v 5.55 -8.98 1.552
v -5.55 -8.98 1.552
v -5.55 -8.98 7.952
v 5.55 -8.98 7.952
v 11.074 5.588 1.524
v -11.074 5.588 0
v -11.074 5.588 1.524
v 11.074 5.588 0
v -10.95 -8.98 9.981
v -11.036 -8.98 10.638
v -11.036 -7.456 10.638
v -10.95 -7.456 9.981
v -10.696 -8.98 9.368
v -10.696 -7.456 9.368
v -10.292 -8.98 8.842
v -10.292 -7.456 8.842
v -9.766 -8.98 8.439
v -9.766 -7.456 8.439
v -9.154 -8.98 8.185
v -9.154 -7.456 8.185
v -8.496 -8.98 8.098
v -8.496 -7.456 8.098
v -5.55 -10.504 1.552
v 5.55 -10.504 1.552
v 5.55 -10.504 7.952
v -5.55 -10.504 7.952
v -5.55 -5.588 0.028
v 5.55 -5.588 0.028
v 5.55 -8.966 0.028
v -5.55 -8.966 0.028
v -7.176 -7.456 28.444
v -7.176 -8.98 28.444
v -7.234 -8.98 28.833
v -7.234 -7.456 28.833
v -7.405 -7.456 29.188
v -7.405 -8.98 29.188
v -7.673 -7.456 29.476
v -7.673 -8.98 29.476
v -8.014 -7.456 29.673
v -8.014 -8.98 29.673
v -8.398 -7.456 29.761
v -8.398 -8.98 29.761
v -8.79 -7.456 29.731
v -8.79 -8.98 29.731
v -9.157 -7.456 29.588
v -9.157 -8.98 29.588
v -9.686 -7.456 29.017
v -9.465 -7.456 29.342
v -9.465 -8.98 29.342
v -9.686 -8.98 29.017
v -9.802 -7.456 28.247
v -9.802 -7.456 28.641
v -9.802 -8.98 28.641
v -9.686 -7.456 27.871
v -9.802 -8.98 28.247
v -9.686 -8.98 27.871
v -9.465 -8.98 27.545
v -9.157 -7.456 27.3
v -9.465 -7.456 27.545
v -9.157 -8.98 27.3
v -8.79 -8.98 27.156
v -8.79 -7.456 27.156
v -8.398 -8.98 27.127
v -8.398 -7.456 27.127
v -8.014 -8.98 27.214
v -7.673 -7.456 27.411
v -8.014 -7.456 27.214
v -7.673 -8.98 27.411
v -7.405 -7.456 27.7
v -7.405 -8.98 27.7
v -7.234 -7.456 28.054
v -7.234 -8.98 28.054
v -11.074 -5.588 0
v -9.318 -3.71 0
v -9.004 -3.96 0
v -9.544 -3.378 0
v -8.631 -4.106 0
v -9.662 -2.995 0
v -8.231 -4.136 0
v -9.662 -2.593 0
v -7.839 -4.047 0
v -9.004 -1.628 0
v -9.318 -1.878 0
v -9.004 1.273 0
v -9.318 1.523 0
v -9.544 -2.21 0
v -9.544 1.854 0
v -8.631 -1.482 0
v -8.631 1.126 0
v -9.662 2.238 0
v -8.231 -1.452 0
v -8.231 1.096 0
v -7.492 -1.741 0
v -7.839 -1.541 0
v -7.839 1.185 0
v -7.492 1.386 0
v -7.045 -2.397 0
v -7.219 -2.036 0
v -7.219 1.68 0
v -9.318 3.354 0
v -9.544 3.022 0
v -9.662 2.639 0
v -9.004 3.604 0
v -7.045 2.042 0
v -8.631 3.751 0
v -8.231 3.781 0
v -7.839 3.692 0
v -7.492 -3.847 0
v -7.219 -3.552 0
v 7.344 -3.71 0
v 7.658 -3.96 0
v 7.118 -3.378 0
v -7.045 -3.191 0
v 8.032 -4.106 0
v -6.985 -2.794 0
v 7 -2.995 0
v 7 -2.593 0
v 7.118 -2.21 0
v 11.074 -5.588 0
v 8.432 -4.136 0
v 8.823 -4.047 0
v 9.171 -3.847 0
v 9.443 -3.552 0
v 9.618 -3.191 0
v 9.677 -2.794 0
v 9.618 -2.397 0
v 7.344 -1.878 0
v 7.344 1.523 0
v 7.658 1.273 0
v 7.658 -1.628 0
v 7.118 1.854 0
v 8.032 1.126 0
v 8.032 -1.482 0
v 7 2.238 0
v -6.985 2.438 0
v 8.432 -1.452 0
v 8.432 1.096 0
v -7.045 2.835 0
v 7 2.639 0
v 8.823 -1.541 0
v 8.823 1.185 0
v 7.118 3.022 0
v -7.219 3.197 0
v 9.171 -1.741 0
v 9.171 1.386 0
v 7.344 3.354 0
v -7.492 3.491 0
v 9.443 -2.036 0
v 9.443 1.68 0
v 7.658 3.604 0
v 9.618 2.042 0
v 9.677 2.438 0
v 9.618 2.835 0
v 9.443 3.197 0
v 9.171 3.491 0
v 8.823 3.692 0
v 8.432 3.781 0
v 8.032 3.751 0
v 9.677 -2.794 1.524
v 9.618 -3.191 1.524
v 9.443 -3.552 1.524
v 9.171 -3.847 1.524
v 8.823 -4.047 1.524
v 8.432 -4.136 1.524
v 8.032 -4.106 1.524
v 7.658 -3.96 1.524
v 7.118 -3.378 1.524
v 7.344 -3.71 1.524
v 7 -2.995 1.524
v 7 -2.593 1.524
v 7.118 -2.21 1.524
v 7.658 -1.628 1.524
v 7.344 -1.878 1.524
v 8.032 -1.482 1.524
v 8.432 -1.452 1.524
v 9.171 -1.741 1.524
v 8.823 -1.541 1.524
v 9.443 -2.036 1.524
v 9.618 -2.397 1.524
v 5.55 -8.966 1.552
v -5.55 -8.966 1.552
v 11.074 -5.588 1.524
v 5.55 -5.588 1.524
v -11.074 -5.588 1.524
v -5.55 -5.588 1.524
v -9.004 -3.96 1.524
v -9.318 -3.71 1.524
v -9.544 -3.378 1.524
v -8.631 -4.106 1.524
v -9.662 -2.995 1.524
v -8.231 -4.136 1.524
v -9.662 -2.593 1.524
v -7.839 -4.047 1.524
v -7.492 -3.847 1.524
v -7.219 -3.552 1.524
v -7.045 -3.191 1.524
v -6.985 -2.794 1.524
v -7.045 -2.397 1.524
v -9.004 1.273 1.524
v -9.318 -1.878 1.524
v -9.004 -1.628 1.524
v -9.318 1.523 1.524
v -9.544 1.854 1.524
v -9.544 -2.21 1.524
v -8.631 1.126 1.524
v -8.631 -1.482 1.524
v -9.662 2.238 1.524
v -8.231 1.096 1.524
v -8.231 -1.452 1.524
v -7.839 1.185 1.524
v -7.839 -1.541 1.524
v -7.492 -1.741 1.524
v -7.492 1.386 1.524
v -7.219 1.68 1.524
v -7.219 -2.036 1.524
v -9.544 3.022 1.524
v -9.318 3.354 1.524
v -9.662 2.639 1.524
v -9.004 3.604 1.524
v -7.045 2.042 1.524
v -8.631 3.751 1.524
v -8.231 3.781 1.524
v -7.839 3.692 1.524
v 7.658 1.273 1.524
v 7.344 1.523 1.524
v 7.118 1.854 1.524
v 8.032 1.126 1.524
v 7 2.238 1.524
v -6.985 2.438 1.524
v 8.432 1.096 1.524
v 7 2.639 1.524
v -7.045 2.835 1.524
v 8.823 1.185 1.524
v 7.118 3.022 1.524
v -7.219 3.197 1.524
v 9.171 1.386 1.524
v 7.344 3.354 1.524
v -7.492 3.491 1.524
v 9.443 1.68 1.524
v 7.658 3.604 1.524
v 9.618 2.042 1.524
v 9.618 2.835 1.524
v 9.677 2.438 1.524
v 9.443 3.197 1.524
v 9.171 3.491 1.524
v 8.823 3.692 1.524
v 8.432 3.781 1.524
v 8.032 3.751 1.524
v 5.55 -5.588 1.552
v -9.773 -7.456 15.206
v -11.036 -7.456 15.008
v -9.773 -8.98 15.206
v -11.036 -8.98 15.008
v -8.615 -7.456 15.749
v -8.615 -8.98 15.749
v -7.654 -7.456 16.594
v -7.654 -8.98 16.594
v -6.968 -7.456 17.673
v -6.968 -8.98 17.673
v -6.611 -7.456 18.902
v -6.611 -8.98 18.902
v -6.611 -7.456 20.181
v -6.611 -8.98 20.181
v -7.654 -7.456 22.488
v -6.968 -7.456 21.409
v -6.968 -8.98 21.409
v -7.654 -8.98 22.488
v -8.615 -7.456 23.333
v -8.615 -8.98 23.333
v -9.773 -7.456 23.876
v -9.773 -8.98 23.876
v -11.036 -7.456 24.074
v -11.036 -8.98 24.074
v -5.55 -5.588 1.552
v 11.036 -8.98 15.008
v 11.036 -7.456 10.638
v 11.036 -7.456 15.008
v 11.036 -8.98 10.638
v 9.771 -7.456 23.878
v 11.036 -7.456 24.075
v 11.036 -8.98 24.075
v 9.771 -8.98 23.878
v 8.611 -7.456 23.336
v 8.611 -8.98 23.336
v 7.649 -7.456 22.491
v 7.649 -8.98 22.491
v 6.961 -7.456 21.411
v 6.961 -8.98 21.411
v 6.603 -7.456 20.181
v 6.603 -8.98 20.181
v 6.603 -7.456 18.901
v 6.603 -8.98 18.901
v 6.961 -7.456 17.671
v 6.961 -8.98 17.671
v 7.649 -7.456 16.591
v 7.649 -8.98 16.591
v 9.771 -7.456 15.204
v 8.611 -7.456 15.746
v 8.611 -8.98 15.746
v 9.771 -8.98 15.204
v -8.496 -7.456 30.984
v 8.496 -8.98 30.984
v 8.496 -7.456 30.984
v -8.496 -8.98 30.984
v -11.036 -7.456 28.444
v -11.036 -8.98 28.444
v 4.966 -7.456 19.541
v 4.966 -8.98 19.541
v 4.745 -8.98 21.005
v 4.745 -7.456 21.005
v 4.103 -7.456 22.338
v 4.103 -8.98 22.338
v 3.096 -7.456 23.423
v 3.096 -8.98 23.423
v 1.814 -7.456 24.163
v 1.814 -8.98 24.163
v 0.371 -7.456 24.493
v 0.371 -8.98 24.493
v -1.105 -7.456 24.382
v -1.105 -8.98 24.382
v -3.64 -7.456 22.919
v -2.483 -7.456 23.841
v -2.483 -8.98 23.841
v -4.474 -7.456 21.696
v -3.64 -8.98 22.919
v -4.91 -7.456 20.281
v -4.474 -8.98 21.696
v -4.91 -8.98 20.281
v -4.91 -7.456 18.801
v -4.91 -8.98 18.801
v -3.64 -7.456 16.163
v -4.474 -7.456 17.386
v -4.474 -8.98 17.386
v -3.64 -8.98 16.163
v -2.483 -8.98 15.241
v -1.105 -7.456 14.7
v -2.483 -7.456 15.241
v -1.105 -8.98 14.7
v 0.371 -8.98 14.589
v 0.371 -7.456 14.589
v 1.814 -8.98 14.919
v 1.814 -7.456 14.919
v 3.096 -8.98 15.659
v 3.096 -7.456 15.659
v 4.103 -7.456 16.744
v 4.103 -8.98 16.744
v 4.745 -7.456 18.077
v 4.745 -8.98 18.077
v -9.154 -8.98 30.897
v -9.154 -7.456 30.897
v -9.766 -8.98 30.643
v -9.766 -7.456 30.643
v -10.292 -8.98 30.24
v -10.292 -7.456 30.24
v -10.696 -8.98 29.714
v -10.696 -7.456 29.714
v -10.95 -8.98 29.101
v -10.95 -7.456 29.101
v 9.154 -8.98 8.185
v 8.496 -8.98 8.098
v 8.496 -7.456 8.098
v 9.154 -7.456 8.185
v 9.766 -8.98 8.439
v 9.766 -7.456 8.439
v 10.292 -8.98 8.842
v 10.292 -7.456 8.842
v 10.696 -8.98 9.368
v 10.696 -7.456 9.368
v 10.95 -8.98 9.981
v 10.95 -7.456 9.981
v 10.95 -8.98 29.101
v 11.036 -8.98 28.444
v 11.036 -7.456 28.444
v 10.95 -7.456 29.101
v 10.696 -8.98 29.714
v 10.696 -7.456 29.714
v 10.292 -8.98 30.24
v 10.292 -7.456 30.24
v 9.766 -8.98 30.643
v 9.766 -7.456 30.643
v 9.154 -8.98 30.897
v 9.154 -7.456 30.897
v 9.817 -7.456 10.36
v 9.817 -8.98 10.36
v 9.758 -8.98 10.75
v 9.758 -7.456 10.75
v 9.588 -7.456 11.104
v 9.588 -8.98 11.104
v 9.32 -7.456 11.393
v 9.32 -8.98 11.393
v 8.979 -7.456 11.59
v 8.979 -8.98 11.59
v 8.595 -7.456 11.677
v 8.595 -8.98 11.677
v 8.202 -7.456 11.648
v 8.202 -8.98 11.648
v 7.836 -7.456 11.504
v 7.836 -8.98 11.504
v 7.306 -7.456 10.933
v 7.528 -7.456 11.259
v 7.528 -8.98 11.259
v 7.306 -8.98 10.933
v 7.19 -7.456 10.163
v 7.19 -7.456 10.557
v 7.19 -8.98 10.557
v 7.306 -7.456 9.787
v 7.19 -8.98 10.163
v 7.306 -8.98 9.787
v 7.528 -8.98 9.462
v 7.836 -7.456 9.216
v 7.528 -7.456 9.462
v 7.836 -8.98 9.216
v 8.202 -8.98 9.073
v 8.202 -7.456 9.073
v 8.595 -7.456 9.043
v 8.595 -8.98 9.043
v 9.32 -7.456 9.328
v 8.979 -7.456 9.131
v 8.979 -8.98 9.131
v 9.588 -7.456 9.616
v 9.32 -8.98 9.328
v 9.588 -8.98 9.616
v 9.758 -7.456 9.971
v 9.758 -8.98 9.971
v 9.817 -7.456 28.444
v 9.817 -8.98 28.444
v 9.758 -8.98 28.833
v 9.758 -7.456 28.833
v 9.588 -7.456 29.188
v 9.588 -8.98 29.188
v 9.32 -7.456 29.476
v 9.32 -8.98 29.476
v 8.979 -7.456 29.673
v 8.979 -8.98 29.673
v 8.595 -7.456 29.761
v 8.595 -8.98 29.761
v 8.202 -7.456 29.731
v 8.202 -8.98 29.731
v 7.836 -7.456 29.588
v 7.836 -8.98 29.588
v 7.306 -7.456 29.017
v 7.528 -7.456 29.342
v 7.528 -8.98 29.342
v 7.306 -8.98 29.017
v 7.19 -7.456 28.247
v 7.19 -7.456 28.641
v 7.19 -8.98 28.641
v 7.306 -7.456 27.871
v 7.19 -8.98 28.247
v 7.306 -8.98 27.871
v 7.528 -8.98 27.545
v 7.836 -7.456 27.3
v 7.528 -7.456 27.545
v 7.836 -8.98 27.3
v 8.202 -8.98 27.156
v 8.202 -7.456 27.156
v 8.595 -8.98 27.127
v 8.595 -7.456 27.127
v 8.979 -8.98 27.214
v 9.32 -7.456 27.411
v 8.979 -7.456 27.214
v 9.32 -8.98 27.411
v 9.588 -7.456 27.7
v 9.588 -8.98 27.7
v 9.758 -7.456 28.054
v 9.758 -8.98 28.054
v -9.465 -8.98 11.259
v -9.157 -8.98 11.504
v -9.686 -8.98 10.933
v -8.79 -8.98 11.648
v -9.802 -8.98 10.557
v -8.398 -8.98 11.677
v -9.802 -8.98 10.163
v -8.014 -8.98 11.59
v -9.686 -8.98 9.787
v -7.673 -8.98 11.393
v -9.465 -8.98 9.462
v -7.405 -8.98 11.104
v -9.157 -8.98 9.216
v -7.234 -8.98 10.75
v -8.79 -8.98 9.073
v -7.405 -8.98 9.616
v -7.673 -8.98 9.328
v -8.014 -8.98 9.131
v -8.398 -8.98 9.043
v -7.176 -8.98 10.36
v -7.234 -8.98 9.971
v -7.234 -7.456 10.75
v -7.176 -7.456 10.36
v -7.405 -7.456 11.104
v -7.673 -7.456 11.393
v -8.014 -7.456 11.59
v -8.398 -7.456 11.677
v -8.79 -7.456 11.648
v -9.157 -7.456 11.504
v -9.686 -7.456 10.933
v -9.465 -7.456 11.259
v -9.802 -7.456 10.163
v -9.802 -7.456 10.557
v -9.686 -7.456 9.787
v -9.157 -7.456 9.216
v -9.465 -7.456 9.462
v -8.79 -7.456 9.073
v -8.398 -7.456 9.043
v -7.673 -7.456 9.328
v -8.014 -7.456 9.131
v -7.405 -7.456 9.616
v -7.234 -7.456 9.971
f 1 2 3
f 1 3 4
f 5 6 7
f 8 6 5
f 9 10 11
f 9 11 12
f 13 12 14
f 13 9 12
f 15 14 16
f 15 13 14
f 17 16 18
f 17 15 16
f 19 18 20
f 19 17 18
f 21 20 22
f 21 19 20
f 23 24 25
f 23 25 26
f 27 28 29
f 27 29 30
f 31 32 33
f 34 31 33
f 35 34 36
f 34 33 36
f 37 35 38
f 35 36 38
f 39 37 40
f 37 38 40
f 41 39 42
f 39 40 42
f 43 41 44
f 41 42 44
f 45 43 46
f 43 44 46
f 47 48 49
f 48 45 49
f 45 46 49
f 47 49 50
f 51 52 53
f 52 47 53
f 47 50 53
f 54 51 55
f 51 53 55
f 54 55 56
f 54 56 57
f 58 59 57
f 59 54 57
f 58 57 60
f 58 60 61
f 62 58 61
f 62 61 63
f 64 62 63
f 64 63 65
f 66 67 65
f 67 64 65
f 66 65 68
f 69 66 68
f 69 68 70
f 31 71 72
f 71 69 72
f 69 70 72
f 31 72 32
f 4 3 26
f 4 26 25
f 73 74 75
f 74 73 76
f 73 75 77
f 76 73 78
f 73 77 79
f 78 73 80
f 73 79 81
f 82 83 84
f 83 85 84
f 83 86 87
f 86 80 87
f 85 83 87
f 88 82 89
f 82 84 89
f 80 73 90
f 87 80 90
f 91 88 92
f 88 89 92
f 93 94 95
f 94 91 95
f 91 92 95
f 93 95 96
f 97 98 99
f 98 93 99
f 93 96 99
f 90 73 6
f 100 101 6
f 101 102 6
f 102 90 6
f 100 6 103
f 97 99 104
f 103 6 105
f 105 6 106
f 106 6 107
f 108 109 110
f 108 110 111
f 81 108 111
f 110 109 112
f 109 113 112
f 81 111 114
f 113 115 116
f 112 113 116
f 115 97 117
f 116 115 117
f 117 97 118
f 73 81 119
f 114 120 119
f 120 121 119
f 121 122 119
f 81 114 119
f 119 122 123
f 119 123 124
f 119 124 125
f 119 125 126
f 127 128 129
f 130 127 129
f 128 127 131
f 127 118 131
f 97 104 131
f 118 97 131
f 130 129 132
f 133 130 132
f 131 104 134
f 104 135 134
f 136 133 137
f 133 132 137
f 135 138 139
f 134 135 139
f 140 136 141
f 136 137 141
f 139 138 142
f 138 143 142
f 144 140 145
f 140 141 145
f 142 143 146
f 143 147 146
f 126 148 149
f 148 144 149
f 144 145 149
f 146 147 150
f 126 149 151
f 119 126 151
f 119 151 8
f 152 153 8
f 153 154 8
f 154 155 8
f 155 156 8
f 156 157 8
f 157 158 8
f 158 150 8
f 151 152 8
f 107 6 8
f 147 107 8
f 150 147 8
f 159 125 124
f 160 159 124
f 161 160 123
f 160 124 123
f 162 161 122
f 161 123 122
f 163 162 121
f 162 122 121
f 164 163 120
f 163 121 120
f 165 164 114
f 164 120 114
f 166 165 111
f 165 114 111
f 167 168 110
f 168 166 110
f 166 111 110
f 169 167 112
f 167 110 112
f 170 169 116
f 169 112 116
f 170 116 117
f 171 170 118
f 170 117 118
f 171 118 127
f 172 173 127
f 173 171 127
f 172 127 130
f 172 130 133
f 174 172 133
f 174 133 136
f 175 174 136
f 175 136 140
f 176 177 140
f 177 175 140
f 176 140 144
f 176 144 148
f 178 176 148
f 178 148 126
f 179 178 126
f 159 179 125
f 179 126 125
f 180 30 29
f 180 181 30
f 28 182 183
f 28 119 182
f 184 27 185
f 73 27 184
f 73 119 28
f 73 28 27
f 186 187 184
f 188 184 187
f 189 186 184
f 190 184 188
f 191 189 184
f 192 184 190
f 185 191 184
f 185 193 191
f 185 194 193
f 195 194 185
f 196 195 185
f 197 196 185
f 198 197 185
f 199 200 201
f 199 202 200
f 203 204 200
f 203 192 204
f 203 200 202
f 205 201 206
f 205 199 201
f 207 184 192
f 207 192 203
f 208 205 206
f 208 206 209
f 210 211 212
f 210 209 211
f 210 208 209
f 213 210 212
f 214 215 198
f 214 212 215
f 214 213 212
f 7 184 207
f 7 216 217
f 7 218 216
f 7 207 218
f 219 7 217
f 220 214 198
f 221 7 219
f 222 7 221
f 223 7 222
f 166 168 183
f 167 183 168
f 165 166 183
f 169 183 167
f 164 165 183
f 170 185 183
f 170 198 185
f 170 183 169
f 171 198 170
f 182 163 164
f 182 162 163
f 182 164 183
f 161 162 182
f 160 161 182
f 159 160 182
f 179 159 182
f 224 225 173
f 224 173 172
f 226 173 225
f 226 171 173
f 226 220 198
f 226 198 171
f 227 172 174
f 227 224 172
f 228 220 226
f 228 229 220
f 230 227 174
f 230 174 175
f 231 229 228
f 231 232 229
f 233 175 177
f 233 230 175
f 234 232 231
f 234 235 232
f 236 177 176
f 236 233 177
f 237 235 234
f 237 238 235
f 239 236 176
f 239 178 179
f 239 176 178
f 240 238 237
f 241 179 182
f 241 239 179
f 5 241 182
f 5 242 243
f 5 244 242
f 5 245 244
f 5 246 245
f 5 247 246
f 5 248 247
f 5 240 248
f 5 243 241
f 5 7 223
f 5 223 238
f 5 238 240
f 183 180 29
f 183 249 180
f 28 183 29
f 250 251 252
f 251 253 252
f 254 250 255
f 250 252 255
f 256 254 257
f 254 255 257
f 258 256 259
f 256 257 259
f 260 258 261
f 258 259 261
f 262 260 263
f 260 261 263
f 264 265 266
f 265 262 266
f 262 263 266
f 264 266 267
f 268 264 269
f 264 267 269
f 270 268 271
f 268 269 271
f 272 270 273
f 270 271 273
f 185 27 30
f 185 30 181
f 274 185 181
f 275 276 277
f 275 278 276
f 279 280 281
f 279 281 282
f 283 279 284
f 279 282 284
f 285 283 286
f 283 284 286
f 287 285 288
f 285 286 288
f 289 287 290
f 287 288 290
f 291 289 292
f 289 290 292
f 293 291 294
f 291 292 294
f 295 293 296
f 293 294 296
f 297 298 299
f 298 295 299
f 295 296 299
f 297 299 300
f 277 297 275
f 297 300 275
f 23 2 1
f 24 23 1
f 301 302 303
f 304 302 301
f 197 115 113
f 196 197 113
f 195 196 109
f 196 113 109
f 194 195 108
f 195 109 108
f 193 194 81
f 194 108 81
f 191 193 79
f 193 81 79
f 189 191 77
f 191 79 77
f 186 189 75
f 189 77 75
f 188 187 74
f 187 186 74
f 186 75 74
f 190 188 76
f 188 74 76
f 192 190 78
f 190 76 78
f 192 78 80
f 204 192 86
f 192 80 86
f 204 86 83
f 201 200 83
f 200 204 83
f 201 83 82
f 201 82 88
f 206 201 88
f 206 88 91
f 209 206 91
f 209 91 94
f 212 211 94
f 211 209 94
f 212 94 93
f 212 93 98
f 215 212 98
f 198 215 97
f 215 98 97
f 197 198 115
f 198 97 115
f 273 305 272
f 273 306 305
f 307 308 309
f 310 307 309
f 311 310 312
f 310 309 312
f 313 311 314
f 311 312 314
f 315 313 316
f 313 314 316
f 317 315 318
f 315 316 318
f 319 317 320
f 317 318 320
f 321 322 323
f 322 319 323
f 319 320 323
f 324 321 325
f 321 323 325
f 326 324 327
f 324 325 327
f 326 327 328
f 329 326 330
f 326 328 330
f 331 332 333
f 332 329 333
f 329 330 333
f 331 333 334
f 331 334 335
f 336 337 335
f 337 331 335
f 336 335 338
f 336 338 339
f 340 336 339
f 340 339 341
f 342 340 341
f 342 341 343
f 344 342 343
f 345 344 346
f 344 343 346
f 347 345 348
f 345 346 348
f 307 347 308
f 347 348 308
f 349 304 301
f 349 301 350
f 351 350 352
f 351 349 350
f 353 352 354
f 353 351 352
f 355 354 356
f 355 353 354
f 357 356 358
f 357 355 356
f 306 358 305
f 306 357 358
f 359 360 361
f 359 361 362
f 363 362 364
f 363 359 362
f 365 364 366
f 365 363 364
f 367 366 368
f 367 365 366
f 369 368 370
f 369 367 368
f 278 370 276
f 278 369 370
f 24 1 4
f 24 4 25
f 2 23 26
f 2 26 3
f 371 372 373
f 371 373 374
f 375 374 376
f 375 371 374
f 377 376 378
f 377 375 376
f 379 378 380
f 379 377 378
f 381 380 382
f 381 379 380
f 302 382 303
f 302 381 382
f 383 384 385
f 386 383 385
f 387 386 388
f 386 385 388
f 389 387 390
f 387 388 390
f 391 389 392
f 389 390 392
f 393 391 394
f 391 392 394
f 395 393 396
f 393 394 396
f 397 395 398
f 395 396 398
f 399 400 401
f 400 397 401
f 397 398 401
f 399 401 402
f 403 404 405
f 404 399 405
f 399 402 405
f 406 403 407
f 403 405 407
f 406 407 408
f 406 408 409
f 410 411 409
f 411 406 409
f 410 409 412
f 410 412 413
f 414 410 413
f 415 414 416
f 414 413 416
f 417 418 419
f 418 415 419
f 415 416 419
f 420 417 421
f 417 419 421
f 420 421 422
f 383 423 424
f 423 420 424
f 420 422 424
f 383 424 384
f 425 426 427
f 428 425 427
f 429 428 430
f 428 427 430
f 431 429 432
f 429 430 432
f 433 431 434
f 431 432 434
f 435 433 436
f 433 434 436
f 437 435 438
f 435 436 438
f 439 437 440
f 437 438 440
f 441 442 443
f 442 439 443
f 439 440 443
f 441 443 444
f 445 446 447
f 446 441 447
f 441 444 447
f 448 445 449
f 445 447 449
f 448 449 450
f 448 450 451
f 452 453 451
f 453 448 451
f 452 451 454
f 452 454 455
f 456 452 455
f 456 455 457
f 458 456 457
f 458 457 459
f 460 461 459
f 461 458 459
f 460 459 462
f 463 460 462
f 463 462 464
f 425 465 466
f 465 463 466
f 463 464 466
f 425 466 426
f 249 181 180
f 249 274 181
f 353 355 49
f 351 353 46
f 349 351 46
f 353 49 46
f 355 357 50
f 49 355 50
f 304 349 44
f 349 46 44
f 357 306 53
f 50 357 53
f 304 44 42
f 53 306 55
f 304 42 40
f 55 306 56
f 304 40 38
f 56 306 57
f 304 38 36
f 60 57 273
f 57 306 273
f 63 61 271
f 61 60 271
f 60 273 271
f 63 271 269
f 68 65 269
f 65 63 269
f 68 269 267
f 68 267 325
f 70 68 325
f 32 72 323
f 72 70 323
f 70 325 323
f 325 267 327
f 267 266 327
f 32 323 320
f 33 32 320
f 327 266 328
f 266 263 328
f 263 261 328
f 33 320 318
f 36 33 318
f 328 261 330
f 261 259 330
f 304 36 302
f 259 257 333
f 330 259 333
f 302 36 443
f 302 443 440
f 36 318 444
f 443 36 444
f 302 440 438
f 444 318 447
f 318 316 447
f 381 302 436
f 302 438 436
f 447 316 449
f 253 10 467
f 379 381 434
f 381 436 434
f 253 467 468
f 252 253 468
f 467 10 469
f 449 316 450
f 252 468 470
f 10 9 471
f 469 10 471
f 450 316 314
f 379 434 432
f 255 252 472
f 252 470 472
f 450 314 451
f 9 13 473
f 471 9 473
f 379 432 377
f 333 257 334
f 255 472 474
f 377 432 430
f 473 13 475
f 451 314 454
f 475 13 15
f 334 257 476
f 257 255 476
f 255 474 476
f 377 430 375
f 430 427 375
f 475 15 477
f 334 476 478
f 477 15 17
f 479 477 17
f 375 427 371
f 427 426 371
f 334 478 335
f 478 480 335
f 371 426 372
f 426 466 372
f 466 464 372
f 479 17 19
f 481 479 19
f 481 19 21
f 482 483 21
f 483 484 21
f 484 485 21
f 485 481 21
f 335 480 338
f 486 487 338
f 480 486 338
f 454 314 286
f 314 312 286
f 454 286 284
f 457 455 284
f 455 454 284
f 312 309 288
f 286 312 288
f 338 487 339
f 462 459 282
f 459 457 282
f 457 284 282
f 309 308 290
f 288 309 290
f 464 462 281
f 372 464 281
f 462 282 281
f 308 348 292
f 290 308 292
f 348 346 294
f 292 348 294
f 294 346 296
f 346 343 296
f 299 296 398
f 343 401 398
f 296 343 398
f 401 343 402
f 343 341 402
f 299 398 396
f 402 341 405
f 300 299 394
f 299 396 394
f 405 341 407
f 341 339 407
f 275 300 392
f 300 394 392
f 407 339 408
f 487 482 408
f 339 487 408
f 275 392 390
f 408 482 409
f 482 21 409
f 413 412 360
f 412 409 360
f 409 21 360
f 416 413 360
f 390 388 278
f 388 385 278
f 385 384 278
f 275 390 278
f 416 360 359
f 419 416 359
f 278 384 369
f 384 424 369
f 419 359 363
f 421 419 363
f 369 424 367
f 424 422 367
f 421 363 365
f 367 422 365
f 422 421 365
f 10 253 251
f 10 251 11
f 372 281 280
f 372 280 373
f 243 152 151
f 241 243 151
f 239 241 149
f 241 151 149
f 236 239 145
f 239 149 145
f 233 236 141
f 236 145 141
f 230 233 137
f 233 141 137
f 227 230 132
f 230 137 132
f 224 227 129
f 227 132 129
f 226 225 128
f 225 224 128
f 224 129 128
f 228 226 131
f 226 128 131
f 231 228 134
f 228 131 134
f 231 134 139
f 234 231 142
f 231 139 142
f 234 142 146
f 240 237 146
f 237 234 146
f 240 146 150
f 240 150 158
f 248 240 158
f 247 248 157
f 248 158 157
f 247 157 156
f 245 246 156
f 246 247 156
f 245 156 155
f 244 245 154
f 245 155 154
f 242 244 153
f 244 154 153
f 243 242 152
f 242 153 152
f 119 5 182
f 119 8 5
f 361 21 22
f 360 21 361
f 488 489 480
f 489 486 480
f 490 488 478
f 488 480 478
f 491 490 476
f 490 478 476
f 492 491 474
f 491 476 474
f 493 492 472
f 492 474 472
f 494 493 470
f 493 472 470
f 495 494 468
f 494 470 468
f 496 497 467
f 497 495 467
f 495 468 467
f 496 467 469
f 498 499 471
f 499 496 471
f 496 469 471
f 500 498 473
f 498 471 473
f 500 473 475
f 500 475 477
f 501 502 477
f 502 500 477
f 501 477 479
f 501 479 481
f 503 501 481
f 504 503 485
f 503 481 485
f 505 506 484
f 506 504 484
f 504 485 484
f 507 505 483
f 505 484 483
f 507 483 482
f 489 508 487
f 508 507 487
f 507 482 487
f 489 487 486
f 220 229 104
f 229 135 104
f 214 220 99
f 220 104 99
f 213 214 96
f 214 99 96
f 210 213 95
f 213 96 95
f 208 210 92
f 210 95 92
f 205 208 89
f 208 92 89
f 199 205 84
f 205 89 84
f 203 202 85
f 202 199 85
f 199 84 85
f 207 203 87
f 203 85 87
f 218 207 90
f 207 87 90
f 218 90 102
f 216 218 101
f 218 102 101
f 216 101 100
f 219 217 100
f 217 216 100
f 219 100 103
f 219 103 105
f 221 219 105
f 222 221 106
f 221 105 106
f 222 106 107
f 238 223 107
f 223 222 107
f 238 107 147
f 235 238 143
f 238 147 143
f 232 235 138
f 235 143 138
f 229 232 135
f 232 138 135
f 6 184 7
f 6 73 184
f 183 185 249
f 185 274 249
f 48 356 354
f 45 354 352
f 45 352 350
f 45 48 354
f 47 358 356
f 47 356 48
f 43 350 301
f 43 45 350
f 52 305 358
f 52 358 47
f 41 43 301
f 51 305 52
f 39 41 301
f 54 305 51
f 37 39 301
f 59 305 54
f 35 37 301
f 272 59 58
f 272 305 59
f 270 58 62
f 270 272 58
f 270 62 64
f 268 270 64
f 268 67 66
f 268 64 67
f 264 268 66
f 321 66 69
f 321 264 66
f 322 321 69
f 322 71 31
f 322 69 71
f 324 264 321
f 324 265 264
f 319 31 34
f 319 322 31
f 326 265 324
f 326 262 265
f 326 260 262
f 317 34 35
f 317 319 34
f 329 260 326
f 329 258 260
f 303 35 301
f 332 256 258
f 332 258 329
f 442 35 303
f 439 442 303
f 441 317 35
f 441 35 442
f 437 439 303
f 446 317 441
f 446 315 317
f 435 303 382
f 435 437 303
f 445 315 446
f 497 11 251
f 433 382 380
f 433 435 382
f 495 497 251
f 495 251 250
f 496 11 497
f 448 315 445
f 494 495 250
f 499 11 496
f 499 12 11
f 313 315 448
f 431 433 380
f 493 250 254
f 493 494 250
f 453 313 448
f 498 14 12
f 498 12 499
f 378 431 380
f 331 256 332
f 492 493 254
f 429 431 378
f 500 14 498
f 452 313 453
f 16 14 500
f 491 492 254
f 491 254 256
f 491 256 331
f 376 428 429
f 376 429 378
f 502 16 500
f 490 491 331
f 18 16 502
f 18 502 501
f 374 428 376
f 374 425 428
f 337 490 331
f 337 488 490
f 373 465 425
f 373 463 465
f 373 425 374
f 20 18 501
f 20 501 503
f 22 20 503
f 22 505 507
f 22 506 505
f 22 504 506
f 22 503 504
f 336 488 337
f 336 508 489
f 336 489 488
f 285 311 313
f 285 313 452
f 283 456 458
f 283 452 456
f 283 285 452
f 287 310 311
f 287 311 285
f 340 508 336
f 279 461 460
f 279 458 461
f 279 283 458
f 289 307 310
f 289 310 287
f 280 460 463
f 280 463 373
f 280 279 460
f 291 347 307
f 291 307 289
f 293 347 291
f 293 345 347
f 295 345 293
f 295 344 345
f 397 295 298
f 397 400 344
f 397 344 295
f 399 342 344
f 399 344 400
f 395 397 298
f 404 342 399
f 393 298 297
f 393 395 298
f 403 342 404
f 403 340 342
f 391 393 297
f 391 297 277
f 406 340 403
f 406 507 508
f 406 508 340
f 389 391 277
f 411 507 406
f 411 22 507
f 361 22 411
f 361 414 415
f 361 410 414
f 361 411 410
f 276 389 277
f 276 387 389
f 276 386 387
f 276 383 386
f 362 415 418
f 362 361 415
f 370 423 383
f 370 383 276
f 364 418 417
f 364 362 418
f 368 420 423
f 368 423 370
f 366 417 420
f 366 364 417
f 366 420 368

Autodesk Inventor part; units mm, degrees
ref_plane "YZ Plane" through (0, 0, 0) normal (1, 0, 0) x (0, 1, 0)
ref_plane "XZ Plane" through (0, 0, 0) normal (0, 1, 0) x (-1, 0, 0)
ref_plane "XY Plane" through (0, 0, 0) normal (0, 0, 1) x (1, 0, 0)
sketch "Sketch1" plane through (0, 0, 0) normal (0, 0, 1) x (1, 0, 0)
  line L0 (-11.0744, 5.588) -> (11.0744, 5.588)
  line L1 (11.0744, 5.588) -> (11.0744, -5.588)
  line L2 (11.0744, -5.588) -> (-11.0744, -5.588)
  line L3 (-11.0744, -5.588) -> (-11.0744, 5.588)
  circle A0 centre (-8.3312, 2.4384) radius 1.3462
  circle A1 centre (8.3312, 2.4384) radius 1.3462
  circle A2 centre (8.3312, -2.794) radius 1.3462
  circle A3 centre (-8.3312, -2.794) radius 1.3462
  point P0 (0, 0)
  dimension "d0" = 22.1488
  dimension "d1" = 11.176
  dimension "d2" = 2.6924
  dimension "d3" = 2.6924
  dimension "d4" = 2.6924
  dimension "d5" = 2.6924
  dimension "d6" = 3.1496
  dimension "d7" = 2.794
  dimension "d8" = 5.2324
  dimension "d9" = 2.7432
  dimension "d10" = 2.7432
  dimension "d11" = 3.1496
  dimension "d12" = 2.794
extrude "Extrusion1" add sketch "Sketch1" along normal blind 1.524
sketch "Sketch2" plane through (-11.0744, -5.588, 0) normal (0, -1, 0) x (1, 0, 0)
  line L0 (5.5245, 1.5517) -> (16.6243, 1.5517)
  line L1 (16.6243, 1.5517) -> (16.6243, 0.0277)
  line L2 (16.6243, 0.0277) -> (5.5245, 0.0277)
  line L3 (5.5245, 0.0277) -> (5.5245, 1.5517)
  point P0 (11.0744, 0)
  dimension "d15" = 11.0998
  dimension "d16" = 1.524
extrude "Extrusion2" add sketch "Sketch2" along normal blind 3.3782
sketch "Sketch3" plane through (-5.5499, -5.588, 1.5517) normal (0, 0, 1) x (1, 0, 0)
  line L0 (0, -3.3922) -> (11.0998, -3.3922)
  line L1 (11.0998, -3.3922) -> (11.0998, -4.9162)
  line L2 (11.0998, -4.9162) -> (0, -4.9162)
  line L3 (0, -4.9162) -> (0, -3.3922)
  point P0 (5.5499, 5.588)
  dimension "d19" = 11.0998
  dimension "d20" = 1.524
extrude "Extrusion3" add sketch "Sketch3" along normal blind 6.4008
sketch "Sketch4" plane through (-5.5499, -8.9802, 1.5517) normal (0, 1, 0) x (1, 0, 0)
  line L0 (14.0462, -29.432) -> (-2.9464, -29.432)
  line L1 (-2.9464, -6.5466) -> (14.0462, -6.5466)
  line L2 (-5.5245, 1.5517) -> (16.6243, 1.5517) projected
  arc A0 (-5.4864, -22.5228) -> (-5.4864, -13.4559) centre (-5.5498, -17.9893) ccw
  arc A1 (16.5862, -13.4558) -> (16.5862, -22.5229) centre (16.6412, -17.9893) ccw
  line L3 (16.5862, -9.0866) -> (16.5862, -13.4558)
  line L4 (16.5862, -22.5229) -> (16.5862, -26.892)
  line L5 (-5.4864, -26.892) -> (-5.4864, -22.5228)
  line L6 (-5.4864, -13.4559) -> (-5.4864, -9.0866)
  circle A2 centre (5.5499, -17.9893) radius 4.9657
  arc A3 (14.0462, -29.432) -> (16.5862, -26.892) centre (14.0462, -26.892) ccw
  arc A4 (-5.4864, -26.892) -> (-2.9464, -29.432) centre (-2.9464, -26.892) ccw
  arc A5 (16.5862, -9.0866) -> (14.0462, -6.5466) centre (14.0462, -9.0866) ccw
  arc A6 (-2.9464, -6.5466) -> (-5.4864, -9.0866) centre (-2.9464, -9.0866) ccw
  circle A7 centre (14.0462, -26.892) radius 1.3208
  circle A8 centre (14.0462, -8.8085) radius 1.3208
  circle A9 centre (-2.9464, -8.8085) radius 1.3208
  circle A10 centre (-2.9464, -26.892) radius 1.3208
  point P0 (5.5499, 1.5517)
  point P1 (-5.4864, -6.5466)
  point P2 (-5.4864, -29.432)
  point P3 (16.5862, -6.5466)
  point P4 (5.5499, 1.5517)
  point P5 (16.5862, -17.9893)
  point P6 (5.5499, 1.5517)
  dimension "d25" = 9.0678
  dimension "d26" = 9.0678
  dimension "d27" = 9.9314
  dimension "d28" = 2.54
  dimension "d29" = 2.6416
  dimension "d30" = 2.6416
  dimension "d31" = 2.6416
  dimension "d32" = 2.6416
  dimension "d33" = 2.54
extrude "Extrusion4" add sketch "Sketch4" along normal blind 1.524
properties part number "motor mount"
